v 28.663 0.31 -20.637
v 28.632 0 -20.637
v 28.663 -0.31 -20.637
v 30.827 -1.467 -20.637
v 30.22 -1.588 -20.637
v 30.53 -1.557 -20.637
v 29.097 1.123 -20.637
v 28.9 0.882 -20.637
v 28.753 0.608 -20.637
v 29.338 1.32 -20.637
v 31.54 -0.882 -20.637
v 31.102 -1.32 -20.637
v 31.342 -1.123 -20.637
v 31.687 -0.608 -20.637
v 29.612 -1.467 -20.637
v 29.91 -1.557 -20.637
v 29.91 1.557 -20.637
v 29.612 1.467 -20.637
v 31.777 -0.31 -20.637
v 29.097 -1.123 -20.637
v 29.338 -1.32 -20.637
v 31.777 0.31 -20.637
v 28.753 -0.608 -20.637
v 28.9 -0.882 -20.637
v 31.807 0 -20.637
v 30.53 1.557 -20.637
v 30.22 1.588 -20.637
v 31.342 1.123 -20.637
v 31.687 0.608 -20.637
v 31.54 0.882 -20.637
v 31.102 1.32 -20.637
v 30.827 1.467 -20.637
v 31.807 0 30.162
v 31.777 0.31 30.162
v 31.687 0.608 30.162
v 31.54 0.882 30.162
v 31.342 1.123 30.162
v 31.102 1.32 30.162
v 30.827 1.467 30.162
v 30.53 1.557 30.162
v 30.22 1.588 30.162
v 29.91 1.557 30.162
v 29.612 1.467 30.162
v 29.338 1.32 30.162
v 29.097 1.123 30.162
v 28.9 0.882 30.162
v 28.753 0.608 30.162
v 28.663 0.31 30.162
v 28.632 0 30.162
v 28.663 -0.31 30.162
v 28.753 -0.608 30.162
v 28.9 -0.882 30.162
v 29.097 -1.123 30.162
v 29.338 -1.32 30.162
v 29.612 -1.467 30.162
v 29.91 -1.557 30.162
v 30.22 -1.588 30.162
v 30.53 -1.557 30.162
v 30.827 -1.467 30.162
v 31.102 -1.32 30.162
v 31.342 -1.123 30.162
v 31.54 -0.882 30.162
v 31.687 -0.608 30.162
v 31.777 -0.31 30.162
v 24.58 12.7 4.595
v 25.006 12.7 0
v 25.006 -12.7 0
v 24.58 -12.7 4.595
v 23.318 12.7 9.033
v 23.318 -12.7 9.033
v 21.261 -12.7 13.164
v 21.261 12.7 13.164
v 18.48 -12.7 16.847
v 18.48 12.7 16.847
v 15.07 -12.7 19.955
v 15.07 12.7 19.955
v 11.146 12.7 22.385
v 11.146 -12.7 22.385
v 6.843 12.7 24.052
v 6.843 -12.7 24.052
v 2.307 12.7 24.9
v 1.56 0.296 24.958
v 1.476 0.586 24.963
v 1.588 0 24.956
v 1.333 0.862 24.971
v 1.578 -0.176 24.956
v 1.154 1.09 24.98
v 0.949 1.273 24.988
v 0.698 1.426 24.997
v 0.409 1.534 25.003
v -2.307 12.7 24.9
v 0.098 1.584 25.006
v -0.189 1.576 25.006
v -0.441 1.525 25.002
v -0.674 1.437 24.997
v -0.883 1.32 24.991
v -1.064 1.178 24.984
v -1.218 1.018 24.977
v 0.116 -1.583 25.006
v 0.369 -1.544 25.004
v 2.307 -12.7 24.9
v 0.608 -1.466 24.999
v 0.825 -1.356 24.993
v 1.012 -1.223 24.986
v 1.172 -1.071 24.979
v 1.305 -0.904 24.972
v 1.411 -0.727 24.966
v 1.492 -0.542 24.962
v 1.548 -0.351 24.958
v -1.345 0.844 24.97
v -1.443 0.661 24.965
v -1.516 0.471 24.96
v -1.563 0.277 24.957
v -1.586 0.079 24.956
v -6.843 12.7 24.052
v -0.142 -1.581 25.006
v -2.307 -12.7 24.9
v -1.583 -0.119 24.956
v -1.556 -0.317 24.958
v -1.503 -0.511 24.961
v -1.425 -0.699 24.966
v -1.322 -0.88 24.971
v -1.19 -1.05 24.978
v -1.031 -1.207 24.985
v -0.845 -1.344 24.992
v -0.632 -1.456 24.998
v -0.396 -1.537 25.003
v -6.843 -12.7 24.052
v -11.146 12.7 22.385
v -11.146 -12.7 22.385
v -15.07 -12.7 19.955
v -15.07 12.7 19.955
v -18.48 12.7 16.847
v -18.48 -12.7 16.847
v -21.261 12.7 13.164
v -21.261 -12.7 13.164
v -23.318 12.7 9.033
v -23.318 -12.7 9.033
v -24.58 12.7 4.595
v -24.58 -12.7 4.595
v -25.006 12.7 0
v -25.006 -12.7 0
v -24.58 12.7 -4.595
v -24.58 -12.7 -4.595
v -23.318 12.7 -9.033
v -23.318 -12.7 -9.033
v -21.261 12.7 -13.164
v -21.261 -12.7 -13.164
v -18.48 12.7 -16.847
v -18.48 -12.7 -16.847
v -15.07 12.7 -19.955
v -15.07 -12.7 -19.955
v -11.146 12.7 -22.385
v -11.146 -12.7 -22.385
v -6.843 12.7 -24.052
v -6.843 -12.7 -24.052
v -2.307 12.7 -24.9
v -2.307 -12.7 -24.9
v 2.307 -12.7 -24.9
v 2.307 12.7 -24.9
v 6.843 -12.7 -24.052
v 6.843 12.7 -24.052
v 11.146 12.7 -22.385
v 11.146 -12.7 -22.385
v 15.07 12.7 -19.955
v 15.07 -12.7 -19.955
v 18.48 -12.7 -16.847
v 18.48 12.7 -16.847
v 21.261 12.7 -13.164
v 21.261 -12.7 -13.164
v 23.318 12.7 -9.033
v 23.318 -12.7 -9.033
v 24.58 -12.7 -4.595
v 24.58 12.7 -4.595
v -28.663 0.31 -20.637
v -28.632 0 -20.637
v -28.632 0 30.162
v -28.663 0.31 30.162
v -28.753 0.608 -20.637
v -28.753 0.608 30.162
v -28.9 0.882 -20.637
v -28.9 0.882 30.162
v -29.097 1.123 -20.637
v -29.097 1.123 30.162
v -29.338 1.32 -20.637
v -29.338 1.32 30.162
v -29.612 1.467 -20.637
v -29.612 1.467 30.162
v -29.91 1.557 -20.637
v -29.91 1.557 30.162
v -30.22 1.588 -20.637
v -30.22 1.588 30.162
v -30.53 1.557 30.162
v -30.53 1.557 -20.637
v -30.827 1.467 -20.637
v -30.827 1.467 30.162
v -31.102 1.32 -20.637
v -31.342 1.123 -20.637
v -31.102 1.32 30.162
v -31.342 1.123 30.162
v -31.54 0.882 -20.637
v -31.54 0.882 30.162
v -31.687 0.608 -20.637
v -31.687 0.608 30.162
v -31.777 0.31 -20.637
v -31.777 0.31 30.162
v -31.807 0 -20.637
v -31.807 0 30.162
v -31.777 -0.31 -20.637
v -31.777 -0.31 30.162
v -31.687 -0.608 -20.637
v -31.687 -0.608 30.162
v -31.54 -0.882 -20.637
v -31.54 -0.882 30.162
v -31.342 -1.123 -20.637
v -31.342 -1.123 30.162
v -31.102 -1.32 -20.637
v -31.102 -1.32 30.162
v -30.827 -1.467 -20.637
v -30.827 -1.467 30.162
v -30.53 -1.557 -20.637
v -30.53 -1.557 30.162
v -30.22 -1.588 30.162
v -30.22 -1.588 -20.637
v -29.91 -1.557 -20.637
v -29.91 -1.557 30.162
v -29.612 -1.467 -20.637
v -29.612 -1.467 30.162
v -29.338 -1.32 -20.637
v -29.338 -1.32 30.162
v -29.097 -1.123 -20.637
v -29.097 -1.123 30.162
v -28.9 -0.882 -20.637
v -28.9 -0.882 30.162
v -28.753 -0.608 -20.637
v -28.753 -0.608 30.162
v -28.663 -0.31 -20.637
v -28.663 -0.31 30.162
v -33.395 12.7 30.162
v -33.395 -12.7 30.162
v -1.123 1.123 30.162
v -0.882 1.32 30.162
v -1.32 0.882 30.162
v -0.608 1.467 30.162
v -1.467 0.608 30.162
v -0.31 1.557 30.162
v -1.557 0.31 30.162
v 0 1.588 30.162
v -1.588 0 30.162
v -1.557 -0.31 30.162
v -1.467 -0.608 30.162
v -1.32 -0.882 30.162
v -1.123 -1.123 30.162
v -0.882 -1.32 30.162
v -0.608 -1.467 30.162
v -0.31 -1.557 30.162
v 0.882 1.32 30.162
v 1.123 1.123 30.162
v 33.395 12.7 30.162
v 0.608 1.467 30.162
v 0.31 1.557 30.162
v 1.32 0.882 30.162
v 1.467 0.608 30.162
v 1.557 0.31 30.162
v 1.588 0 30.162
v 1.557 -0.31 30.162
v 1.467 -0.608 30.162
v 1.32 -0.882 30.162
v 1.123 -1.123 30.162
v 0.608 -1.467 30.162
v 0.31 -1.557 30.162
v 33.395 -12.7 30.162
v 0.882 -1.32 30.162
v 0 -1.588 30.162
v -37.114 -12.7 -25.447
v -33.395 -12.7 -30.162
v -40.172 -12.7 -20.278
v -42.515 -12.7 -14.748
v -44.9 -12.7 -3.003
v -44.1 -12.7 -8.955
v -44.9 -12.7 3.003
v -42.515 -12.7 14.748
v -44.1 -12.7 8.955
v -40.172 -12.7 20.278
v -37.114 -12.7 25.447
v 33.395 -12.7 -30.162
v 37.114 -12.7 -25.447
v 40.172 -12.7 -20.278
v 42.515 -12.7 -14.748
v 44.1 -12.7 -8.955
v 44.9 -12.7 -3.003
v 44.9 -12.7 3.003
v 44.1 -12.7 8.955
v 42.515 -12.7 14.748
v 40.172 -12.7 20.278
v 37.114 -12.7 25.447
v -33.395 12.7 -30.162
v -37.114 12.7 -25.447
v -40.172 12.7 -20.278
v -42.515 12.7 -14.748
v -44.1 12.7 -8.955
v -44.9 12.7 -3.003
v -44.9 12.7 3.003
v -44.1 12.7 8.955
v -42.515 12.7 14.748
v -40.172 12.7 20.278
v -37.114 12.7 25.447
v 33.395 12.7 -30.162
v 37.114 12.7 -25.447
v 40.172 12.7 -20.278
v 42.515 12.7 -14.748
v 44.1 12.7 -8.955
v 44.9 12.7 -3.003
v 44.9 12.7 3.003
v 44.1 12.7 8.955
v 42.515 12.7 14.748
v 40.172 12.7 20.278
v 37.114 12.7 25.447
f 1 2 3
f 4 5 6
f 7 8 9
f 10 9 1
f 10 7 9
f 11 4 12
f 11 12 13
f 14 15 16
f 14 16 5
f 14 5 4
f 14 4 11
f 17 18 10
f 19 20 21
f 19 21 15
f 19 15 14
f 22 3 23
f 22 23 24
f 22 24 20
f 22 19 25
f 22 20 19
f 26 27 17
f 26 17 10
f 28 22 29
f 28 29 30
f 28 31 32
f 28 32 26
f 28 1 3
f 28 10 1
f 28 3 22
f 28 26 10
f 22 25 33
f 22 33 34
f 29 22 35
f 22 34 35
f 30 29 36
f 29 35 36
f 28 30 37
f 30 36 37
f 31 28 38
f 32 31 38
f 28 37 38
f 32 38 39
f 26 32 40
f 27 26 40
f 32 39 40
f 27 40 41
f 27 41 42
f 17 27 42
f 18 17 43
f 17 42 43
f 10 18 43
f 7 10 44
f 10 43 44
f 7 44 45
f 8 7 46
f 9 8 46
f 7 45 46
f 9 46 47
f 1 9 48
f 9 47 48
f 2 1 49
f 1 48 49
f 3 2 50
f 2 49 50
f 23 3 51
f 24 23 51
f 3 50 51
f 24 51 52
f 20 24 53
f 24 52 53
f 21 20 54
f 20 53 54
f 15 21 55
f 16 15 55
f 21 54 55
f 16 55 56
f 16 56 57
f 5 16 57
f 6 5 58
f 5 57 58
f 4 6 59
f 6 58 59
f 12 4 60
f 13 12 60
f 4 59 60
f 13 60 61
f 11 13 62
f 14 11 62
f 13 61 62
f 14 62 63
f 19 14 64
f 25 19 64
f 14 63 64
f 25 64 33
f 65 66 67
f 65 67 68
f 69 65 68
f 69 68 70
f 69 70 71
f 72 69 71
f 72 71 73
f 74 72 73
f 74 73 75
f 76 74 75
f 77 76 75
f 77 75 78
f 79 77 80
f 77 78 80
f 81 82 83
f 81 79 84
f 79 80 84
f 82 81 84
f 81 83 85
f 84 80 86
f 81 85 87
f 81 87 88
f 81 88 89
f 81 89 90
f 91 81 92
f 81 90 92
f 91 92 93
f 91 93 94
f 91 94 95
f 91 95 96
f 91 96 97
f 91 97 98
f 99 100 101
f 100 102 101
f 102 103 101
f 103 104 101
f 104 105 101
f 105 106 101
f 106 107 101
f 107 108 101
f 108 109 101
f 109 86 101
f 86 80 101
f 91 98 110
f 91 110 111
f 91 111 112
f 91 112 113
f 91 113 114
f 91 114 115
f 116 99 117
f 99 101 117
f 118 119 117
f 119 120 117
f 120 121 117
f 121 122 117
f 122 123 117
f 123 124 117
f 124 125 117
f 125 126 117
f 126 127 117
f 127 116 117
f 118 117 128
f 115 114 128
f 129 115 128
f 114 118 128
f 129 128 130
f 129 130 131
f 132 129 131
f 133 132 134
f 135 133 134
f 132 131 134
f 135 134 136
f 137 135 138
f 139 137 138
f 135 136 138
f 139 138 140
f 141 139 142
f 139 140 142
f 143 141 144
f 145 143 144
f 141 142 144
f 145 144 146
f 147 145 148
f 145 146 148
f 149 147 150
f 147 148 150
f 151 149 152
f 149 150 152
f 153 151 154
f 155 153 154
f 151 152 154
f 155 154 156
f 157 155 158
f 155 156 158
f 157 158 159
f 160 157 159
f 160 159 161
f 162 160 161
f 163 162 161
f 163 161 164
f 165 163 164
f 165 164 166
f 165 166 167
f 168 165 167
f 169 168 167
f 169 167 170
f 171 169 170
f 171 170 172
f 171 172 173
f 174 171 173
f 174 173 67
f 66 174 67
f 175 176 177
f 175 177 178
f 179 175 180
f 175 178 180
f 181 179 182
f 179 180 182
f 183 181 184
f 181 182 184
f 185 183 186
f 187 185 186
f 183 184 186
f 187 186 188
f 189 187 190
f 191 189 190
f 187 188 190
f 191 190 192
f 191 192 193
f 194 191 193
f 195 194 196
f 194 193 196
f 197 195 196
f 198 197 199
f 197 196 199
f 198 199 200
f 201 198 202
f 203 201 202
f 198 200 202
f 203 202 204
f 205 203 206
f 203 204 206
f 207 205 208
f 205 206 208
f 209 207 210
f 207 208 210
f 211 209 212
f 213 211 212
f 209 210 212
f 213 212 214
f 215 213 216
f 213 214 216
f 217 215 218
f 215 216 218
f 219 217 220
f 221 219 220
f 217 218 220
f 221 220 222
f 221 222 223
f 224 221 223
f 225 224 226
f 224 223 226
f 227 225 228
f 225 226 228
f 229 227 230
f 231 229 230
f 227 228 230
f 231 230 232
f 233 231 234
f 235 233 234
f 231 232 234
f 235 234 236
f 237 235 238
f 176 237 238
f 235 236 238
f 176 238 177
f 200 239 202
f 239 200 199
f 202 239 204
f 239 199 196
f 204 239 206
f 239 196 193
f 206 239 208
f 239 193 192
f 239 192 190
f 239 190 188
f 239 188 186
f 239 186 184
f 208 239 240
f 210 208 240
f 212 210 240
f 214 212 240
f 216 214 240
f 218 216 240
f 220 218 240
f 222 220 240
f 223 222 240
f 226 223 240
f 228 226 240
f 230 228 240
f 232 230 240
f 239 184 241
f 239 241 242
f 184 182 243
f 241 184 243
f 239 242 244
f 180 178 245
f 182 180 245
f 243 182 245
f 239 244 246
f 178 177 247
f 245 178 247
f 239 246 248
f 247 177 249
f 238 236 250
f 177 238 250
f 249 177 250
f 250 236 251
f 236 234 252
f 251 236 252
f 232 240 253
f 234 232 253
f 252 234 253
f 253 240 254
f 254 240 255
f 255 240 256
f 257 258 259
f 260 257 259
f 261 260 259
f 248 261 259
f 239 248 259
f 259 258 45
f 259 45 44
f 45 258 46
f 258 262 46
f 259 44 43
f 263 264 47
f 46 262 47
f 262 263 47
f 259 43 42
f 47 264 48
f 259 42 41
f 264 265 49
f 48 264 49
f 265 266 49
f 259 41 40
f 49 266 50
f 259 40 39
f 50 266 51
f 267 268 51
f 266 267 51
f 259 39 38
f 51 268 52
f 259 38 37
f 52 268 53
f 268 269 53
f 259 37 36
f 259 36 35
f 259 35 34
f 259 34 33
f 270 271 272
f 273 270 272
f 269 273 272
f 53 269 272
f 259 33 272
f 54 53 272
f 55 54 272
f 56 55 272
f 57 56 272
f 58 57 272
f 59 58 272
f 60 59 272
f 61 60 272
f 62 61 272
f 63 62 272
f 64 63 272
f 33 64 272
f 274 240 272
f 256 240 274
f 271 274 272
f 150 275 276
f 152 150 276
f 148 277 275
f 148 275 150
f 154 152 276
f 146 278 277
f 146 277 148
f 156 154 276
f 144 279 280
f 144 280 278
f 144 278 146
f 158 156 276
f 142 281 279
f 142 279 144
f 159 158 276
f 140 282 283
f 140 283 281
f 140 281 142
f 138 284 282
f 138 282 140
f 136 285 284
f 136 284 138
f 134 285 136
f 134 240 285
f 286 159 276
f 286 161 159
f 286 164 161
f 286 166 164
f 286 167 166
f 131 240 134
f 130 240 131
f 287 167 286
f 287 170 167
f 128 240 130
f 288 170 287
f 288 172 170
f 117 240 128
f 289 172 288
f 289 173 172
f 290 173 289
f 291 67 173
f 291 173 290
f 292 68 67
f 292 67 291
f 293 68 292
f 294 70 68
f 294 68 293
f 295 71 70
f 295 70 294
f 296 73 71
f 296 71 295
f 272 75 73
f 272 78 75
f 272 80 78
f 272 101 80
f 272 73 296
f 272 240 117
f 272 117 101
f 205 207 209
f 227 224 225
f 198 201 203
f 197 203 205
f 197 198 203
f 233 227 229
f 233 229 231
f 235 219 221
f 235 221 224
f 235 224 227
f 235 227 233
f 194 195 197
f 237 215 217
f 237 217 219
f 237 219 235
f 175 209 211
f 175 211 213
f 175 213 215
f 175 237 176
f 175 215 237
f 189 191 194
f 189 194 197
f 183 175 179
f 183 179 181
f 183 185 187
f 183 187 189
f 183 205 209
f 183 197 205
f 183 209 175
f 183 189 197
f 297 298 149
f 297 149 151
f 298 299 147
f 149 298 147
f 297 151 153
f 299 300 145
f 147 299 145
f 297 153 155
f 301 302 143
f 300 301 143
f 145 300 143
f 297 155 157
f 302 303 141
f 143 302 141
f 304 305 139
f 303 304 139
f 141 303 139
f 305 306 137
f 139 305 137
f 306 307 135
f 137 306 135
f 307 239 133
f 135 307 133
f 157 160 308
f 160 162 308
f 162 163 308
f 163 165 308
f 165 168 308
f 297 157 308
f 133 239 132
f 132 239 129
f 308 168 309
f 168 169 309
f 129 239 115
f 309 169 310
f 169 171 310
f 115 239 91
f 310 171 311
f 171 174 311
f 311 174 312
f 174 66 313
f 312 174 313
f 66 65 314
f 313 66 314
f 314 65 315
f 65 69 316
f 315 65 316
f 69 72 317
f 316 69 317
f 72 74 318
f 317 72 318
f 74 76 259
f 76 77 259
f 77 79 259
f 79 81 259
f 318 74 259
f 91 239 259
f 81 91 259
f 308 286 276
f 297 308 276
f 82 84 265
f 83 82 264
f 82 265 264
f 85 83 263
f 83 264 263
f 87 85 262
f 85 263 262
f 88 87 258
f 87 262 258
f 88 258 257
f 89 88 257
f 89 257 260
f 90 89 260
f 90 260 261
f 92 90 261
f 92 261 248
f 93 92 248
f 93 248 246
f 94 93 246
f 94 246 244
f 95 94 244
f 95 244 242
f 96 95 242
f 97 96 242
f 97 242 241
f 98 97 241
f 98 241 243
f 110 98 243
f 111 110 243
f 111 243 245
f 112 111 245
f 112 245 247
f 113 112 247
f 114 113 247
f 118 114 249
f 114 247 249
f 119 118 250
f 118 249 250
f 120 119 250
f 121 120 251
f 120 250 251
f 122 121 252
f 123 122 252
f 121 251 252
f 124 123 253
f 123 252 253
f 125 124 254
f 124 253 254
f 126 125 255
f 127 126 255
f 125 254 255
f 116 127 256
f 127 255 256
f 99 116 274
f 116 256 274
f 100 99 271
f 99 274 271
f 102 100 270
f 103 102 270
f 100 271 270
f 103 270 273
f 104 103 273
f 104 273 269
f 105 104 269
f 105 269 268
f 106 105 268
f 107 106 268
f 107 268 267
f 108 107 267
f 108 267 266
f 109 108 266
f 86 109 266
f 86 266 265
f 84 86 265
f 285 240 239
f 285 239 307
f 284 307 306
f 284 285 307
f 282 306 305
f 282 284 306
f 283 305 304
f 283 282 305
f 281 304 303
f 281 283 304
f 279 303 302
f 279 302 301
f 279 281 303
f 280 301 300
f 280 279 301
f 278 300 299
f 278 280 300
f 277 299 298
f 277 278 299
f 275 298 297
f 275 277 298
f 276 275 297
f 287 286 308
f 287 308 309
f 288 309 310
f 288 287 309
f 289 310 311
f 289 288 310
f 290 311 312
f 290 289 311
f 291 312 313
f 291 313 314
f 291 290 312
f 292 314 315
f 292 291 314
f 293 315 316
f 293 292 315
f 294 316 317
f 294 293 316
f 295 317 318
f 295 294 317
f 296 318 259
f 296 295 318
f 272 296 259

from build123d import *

# Parameters (mm, degrees)
F0_R     = 45
F1_DEPTH = 12.7
F3_DEPTH = 25.401
F4_R     = 25.00625
F5_DEPTH = 25.401
F6_R     = 1.5875
F7_DEPTH = 50.8


# Not quite as in the source:
# - a feature names something its author has since deleted; it is built from what else it names


with BuildPart() as f1:
    # F0 (on Front) → F1 (new body, symmetric)
    with BuildSketch(Plane.XZ):
        Circle(F0_R)
    extrude(amount=F1_DEPTH, both=True)

    # F2 (on face) → F3 (cut, through all)
    with BuildSketch(Plane.XZ.offset(12.7)):
        with BuildLine():
            Line((-33.3949635986, 30.1625), (33.3949635986, 30.1625))
            ThreePointArc((33.3949635986, 30.1625), (0, 45), (-33.3949635986, 30.1625))
        make_face()
        with BuildLine():
            ThreePointArc((-33.3949635986, -30.1625), (0, -45), (33.3949635986, -30.1625))
            Line((33.3949635986, -30.1625), (-33.3949635986, -30.1625))
        make_face()
    extrude(amount=-F3_DEPTH, mode=Mode.SUBTRACT)

    # F4 (on face) → F5 (cut, through all)
    with BuildSketch(Plane.XZ.offset(12.7)):
        Circle(F4_R)
    extrude(amount=-F5_DEPTH, mode=Mode.SUBTRACT)

    # F6 (on face) → F7 (cut)
    with BuildSketch(Plane.XY.offset(30.1625)):
        with Locations((30.2199635986, 0)):
            Circle(F6_R)
        Circle(F6_R)
        with Locations((-30.2199635986, 0)):
            Circle(F6_R)
    extrude(amount=-F7_DEPTH, mode=Mode.SUBTRACT)


solid = f1.part
